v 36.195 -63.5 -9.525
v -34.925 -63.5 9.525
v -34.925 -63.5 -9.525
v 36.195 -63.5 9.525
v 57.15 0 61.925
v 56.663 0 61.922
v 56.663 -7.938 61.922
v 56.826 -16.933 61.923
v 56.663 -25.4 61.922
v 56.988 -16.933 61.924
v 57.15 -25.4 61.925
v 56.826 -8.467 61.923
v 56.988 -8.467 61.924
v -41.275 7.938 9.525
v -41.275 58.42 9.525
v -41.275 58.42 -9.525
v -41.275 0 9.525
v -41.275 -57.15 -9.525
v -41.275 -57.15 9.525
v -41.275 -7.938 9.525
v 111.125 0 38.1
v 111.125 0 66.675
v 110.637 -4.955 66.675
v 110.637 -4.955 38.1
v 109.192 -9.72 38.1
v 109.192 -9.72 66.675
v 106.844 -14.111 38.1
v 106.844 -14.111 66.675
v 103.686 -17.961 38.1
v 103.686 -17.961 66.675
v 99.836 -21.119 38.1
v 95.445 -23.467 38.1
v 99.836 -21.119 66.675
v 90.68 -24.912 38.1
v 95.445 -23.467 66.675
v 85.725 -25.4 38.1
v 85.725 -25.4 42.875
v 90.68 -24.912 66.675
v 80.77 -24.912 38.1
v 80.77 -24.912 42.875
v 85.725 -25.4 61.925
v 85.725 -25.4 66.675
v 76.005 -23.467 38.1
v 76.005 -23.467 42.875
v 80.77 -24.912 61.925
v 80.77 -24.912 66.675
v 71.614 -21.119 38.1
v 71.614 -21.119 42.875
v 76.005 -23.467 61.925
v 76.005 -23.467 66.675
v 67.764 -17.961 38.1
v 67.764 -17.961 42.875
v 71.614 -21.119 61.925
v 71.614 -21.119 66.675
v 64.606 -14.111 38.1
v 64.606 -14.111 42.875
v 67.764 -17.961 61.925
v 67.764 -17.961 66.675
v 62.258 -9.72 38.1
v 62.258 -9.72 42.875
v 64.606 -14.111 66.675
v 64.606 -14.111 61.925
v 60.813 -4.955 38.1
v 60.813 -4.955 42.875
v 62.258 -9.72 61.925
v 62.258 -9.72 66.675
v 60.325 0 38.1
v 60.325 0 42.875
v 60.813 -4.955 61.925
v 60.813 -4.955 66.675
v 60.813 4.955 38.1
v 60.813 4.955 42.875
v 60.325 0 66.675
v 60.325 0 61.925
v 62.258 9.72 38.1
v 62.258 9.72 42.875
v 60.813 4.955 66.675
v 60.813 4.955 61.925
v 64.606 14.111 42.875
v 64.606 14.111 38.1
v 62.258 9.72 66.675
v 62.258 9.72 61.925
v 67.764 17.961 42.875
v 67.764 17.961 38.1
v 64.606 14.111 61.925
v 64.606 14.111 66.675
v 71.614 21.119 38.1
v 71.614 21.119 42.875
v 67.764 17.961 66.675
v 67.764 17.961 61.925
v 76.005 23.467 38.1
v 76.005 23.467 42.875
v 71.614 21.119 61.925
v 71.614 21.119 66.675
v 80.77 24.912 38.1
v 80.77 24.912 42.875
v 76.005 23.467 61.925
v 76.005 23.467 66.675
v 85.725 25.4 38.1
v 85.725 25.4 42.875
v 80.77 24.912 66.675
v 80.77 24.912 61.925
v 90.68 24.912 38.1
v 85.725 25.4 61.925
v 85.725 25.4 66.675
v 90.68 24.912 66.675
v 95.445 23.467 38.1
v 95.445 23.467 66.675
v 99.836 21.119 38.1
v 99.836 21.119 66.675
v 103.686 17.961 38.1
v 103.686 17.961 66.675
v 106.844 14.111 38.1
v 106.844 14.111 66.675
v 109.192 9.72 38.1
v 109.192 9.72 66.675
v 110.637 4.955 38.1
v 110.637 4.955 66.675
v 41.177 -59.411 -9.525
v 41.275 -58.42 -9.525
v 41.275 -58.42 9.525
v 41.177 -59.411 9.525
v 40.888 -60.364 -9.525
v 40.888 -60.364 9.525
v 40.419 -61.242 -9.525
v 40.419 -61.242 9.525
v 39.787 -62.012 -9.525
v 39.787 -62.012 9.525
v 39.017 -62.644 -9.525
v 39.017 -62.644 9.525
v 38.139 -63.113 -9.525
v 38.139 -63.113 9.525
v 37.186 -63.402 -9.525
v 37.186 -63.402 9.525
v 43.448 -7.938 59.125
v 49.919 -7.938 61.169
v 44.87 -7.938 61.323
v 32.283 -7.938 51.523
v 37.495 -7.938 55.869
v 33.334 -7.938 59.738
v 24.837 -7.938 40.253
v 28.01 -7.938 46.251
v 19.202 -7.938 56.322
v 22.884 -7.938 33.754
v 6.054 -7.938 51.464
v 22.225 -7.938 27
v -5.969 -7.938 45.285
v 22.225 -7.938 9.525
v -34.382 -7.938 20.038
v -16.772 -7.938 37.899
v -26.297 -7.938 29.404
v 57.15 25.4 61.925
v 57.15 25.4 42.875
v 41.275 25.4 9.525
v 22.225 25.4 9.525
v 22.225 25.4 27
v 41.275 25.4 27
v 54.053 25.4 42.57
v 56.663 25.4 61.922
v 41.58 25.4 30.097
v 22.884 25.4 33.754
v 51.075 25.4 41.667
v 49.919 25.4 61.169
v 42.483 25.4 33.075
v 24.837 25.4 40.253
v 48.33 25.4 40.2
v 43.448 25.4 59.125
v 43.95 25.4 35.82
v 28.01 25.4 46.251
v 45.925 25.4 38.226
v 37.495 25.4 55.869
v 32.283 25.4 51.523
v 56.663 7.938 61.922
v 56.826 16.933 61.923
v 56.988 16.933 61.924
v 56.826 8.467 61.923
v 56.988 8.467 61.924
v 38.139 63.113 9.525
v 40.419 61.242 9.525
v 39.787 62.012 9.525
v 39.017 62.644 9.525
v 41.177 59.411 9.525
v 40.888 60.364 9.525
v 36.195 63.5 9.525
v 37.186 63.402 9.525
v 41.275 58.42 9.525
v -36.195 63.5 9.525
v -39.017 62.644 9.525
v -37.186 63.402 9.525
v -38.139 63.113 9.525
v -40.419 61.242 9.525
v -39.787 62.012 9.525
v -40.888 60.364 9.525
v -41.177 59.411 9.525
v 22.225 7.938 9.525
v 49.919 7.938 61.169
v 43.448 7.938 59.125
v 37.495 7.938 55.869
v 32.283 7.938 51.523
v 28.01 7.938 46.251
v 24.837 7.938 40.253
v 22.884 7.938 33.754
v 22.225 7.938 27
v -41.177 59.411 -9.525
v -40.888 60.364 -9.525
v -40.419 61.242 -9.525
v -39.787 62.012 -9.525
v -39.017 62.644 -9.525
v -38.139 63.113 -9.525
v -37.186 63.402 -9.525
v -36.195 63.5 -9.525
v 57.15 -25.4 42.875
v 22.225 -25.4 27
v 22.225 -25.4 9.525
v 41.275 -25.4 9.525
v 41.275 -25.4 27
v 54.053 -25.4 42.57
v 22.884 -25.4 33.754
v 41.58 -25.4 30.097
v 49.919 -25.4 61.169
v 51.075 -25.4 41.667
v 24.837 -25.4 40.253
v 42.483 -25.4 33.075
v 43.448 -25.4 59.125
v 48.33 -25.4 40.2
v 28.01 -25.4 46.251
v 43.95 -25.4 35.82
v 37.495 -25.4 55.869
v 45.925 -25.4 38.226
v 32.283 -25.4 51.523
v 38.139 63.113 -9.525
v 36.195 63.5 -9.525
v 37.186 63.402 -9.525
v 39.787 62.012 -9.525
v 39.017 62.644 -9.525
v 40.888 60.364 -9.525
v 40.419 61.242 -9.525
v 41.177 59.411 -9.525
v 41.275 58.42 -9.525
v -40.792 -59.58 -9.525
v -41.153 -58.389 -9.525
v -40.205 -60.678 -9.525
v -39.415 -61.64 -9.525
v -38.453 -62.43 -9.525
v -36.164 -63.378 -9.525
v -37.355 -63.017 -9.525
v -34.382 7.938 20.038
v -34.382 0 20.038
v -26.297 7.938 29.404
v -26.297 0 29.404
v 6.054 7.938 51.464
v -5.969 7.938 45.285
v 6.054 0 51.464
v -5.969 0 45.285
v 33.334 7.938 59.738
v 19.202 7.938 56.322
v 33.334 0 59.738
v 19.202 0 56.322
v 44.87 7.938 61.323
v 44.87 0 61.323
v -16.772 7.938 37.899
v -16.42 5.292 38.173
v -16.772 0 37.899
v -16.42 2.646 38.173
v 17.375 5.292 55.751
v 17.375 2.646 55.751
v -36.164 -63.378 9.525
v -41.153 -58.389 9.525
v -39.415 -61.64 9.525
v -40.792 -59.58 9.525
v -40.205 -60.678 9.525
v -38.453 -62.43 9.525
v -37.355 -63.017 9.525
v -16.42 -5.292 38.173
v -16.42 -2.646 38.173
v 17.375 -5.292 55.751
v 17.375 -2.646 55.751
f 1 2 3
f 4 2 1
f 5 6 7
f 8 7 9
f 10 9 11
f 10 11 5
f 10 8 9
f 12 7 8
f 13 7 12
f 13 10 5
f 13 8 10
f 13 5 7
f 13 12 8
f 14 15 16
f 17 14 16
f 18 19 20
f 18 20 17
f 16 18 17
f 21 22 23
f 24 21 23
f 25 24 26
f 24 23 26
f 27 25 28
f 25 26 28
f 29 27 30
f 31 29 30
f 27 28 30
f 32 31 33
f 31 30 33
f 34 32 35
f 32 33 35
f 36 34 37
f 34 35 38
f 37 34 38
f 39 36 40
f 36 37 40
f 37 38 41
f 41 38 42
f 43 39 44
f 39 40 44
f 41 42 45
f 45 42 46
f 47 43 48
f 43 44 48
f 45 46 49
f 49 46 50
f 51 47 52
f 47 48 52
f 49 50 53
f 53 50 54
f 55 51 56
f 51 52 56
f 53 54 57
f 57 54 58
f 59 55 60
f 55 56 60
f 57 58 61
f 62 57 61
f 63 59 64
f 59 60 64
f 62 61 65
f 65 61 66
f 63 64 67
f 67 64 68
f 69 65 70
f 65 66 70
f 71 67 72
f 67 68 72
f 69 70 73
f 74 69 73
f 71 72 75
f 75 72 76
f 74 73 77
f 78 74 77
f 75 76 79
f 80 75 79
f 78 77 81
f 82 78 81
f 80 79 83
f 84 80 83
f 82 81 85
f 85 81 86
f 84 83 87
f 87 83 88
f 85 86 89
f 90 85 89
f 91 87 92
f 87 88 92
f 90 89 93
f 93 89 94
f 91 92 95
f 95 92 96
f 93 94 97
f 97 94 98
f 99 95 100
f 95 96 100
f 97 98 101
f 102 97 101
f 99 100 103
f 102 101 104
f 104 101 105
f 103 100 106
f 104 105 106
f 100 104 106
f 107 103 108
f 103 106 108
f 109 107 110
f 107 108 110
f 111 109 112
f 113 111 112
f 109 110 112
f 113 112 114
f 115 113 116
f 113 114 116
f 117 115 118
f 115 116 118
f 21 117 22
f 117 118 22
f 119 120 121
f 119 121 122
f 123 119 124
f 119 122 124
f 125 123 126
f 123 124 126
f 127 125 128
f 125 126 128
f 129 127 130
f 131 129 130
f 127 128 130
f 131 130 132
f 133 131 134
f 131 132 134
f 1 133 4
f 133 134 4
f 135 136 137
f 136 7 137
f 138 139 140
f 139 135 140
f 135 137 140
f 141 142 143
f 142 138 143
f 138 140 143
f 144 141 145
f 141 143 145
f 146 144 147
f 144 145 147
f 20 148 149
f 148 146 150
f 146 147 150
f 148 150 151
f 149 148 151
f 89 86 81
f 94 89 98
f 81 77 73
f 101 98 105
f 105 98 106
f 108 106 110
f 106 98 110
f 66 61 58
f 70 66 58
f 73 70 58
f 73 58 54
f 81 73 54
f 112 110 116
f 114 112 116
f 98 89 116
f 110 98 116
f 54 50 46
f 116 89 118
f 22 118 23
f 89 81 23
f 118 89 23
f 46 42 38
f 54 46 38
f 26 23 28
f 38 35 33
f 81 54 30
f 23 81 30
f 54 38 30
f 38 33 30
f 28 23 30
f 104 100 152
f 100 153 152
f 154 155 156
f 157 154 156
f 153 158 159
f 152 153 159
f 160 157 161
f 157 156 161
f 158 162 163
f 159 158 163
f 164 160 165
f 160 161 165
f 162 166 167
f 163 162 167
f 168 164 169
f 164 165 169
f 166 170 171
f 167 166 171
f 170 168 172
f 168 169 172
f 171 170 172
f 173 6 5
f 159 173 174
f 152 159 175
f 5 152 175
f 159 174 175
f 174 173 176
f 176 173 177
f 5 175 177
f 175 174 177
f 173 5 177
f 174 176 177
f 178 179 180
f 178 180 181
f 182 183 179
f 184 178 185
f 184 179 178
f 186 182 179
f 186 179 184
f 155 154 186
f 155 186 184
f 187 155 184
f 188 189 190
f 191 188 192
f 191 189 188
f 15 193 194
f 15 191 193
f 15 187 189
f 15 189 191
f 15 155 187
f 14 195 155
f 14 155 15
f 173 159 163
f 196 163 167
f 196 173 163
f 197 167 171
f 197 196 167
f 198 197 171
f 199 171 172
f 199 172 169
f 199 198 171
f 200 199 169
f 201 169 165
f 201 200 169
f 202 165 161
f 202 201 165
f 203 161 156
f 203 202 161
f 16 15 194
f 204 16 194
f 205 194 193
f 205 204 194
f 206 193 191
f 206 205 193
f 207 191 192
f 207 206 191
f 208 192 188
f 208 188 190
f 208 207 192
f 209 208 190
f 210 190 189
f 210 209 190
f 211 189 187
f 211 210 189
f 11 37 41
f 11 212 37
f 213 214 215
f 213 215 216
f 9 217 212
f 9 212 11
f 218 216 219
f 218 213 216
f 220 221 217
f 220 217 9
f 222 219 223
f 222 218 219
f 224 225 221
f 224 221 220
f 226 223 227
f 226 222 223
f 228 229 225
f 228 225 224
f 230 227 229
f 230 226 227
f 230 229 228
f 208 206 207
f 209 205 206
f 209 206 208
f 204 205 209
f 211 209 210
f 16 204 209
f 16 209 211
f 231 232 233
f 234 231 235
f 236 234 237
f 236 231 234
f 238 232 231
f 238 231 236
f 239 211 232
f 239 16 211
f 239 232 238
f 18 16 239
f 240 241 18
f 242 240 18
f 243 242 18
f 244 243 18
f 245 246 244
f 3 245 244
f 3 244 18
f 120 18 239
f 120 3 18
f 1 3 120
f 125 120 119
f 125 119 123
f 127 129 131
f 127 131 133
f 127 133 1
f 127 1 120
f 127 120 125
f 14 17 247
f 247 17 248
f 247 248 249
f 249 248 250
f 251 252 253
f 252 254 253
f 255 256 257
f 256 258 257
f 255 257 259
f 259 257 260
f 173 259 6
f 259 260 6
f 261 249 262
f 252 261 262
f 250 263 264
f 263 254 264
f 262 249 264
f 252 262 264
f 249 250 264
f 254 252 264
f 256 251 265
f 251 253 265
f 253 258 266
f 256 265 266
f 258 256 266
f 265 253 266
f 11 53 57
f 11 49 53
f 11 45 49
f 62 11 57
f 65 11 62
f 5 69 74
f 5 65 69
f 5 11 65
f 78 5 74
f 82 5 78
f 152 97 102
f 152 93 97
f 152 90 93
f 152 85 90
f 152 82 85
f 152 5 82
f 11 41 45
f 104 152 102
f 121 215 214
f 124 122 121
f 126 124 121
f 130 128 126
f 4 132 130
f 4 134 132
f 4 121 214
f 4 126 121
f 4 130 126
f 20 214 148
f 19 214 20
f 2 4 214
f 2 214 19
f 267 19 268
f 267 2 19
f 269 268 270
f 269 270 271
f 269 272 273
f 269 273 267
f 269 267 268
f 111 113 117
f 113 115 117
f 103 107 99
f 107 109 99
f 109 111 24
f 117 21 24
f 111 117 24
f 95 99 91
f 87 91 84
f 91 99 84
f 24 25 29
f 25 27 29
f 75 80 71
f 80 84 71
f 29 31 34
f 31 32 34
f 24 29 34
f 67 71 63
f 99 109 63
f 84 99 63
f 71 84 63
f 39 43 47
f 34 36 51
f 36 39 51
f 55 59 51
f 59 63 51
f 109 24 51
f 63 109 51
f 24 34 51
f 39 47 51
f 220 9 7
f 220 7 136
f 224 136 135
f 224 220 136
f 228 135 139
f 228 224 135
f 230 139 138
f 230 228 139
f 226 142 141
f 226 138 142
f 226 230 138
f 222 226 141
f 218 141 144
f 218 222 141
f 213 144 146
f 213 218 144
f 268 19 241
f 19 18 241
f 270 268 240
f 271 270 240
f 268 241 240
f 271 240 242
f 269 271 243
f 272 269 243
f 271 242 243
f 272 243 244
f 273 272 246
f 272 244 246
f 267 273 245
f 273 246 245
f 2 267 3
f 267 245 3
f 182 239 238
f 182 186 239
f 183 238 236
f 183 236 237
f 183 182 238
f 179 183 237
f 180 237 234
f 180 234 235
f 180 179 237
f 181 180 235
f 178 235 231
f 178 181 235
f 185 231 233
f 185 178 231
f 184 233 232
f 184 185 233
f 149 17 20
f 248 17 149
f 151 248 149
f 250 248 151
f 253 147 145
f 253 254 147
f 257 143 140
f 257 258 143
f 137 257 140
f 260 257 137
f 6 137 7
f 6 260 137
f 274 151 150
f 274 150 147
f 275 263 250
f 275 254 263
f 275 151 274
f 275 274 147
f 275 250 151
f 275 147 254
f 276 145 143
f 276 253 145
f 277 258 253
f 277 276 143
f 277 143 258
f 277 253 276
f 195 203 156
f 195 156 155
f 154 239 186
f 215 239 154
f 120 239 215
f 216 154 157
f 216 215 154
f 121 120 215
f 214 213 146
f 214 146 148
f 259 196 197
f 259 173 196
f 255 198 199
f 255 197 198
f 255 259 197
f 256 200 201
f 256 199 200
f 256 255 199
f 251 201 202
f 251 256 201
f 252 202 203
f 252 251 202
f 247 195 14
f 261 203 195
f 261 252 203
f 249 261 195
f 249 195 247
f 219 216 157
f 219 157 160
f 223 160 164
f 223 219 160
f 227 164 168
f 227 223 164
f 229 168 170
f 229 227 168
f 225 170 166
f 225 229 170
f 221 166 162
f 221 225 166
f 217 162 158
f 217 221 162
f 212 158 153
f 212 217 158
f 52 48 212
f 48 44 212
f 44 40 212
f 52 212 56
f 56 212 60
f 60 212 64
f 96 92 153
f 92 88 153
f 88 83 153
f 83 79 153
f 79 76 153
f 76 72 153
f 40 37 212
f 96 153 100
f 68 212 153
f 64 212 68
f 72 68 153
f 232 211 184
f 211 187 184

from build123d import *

# Parameters (mm, degrees)
F1_DEPTH  = 63.5
F2_DEPTH  = 25.4
F3_DEPTH  = 7.9375
F2_FACE_W = 50.8
F2_FACE_H = 19.05
F4_DEPTH  = 25.4
F7_R      = 5.08
F8_R      = 6.35


with BuildPart() as f1:
    # F0 (on Front) → F1 (new body, symmetric)
    with BuildSketch(Plane.XZ):
        Polygon((22.225, 9.525), (-41.275, 9.525), (-41.275, -9.525), (41.275, -9.525), (41.275, 9.525), align=None)
    extrude(amount=F1_DEPTH, both=True)

    # F0 (on Front) → F2 (join, symmetric)
    with BuildSketch(Plane.XZ):
        with BuildLine():
            Line((22.225, 27.0002), (22.225, 9.525))
            Line((22.225, 9.525), (41.275, 9.525))
            Line((41.275, 9.525), (41.275, 27.0002))
            ThreePointArc((41.275, 27.0002), (45.92468, 38.22552), (57.15, 42.8752))
            Line((57.15, 42.8752), (60.325, 42.8752))
            Line((60.325, 42.8752), (60.325, 61.9252))
            Line((60.325, 61.9252), (57.15, 61.9252))
            add(Edge.make_bspline(
                [(56.663359, 61.921809), (56.825525, 61.923217), (56.987739, 61.924347), (57.15, 61.9252)],
                knots=[111.064005, 111.064005, 111.064005, 111.064005, 111.504536, 111.504536, 111.504536, 111.504536], degree=3))
            ThreePointArc((56.663359, 61.921809), (32.282837, 51.523247), (22.225, 27.0002))
        make_face()
    extrude(amount=F2_DEPTH, both=True)

    # F0 (on Front) → F3 (join, symmetric)
    with BuildSketch(Plane.XZ):
        with BuildLine():
            add(Edge.make_bspline(
                [(-41.275, 9.525), (-22.040929, 43.59531), (15.779117, 61.566989), (56.663359, 61.921809)],
                knots=[0, 0, 0, 0, 111.064005, 111.064005, 111.064005, 111.064005], degree=3))
            Line((-41.275, 9.525), (22.225, 9.525))
            Line((22.225, 9.525), (22.225, 27.0002))
            ThreePointArc((22.225, 27.0002), (32.282837, 51.523247), (56.663359, 61.921809))
        make_face()
    extrude(amount=F3_DEPTH, both=True)

    # F2_face (on face) → F4 (join)
    with BuildSketch(Plane(origin=(60.325, 0, 52.4002), x_dir=(0, 1, 0), z_dir=(1, 0, 0))):
        Rectangle(F2_FACE_W, F2_FACE_H)
    extrude(amount=F4_DEPTH)

    # F0 (on Front) → F6 (revolve)
    with BuildSketch(Plane.XZ):
        Polygon((85.725, 66.675), (85.725, 61.9252), (85.725, 42.8752), (85.725, 38.1), (111.125, 38.1), (111.125, 66.675), align=None)
    revolve(axis=Axis((85.725, 0, 52.3875), (0, 0, -1)))

    # F7
    f7_edges = [f1.edges().sort_by_distance(p)[0] for p in [
        (41.275, -63.5, 0),
        (41.275, 63.5, 0),
        (-41.275, 63.5, 0),
    ]]
    fillet(f7_edges, radius=F7_R)

    # F8
    f8_edges = [f1.edges().sort_by_distance(p)[0] for p in [
        (-41.275, -63.5, 0),
    ]]
    fillet(f8_edges, radius=F8_R)


solid = f1.part
